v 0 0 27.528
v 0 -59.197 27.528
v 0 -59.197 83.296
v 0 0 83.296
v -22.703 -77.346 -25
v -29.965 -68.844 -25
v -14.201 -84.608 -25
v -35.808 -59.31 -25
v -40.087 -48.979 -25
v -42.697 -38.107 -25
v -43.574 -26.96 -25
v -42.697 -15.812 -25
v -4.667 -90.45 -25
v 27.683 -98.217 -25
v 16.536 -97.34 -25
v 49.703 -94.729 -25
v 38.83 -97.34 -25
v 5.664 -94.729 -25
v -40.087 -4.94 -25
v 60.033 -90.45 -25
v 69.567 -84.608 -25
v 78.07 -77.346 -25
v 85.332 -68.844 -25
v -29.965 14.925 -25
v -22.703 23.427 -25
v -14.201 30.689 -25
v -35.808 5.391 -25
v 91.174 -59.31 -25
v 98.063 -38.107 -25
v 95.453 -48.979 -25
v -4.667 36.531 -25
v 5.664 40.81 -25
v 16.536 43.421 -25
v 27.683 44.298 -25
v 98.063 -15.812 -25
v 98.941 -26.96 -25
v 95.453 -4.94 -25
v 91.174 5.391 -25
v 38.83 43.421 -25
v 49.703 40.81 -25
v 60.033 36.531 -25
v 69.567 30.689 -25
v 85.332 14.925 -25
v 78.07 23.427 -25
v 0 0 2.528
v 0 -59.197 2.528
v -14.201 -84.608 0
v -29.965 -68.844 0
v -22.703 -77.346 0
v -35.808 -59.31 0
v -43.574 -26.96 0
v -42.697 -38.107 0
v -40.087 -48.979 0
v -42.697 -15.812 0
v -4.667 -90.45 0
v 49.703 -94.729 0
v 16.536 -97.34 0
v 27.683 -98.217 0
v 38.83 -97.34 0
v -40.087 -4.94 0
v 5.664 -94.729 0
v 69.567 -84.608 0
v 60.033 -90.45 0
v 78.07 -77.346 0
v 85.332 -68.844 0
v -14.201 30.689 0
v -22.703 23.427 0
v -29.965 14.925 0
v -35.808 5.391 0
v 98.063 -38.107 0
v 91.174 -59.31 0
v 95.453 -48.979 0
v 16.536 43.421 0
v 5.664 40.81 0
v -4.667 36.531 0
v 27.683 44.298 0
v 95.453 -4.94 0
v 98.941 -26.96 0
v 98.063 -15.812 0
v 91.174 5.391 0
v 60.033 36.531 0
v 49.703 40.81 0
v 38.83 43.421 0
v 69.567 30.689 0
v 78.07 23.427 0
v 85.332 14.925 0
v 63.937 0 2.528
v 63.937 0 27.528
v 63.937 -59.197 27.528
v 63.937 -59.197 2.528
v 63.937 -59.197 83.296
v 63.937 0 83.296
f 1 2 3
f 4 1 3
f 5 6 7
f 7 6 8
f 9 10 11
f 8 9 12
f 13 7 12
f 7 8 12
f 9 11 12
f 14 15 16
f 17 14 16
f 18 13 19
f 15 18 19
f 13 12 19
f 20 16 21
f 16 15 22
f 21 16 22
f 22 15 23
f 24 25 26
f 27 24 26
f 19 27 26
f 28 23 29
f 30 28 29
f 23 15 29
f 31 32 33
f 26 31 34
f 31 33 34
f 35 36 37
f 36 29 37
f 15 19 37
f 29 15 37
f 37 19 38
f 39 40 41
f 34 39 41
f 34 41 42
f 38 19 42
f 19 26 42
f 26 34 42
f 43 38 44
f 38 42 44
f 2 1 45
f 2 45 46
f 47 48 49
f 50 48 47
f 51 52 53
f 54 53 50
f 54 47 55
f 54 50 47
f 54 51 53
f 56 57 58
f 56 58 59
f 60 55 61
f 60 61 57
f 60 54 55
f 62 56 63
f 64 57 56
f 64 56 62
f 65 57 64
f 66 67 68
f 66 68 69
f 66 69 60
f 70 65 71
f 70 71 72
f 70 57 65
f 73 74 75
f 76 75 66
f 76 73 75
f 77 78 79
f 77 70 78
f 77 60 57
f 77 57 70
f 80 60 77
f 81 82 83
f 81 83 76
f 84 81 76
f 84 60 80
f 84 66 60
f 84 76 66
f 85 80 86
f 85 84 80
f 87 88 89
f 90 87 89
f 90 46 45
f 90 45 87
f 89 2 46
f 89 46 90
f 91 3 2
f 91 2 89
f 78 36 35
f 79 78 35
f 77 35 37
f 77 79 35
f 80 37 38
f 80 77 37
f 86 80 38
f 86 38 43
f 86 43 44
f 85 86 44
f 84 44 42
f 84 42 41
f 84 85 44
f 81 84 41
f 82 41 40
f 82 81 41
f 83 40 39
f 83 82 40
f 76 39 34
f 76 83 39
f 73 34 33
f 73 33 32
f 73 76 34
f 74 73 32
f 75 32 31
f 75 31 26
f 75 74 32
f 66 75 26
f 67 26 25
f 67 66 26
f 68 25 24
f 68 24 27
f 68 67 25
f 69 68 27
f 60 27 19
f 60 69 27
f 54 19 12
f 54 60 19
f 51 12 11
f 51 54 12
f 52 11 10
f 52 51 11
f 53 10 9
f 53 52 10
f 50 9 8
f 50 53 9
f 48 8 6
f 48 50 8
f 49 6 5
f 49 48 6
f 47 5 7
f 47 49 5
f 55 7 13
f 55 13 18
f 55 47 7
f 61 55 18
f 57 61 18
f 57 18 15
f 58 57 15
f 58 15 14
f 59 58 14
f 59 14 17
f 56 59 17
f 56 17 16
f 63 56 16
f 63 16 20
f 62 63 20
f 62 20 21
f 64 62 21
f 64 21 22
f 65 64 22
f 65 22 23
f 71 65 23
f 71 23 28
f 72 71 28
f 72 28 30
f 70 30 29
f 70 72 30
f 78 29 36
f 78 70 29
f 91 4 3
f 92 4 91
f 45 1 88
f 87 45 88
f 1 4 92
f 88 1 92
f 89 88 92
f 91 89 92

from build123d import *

# Parameters (mm, degrees)
F0_W      = 63.937053
F0_H      = 55.767305
F1_DEPTH  = 59.197046
F2_R      = 71.257359
F3_DEPTH  = 25
F1_FACE_W = 63.937054
F1_FACE_H = 59.197046
F4_DEPTH  = 25


with BuildPart() as f1:
    # F0 (on Front) → F1 (new body)
    with BuildSketch(Plane.XZ):
        with Locations((31.968526, 55.412087)):
            Rectangle(F0_W, F0_H)
    extrude(amount=F1_DEPTH)

    # F1_face (on face) → F4 (join)
    with BuildSketch(Plane(origin=(31.968527, -29.598523, 27.528435), x_dir=(1, 0, 0), z_dir=(0, 0, -1))):
        Rectangle(F1_FACE_W, F1_FACE_H)
    extrude(amount=F4_DEPTH)


with BuildPart() as f3:
    # F2 (on Top) → F3 (new body)
    with BuildSketch(Plane.XY):
        with Locations((27.683258, -26.959509)):
            Circle(F2_R)
    extrude(amount=-F3_DEPTH)


solid = Compound([f1.part, f3.part])
